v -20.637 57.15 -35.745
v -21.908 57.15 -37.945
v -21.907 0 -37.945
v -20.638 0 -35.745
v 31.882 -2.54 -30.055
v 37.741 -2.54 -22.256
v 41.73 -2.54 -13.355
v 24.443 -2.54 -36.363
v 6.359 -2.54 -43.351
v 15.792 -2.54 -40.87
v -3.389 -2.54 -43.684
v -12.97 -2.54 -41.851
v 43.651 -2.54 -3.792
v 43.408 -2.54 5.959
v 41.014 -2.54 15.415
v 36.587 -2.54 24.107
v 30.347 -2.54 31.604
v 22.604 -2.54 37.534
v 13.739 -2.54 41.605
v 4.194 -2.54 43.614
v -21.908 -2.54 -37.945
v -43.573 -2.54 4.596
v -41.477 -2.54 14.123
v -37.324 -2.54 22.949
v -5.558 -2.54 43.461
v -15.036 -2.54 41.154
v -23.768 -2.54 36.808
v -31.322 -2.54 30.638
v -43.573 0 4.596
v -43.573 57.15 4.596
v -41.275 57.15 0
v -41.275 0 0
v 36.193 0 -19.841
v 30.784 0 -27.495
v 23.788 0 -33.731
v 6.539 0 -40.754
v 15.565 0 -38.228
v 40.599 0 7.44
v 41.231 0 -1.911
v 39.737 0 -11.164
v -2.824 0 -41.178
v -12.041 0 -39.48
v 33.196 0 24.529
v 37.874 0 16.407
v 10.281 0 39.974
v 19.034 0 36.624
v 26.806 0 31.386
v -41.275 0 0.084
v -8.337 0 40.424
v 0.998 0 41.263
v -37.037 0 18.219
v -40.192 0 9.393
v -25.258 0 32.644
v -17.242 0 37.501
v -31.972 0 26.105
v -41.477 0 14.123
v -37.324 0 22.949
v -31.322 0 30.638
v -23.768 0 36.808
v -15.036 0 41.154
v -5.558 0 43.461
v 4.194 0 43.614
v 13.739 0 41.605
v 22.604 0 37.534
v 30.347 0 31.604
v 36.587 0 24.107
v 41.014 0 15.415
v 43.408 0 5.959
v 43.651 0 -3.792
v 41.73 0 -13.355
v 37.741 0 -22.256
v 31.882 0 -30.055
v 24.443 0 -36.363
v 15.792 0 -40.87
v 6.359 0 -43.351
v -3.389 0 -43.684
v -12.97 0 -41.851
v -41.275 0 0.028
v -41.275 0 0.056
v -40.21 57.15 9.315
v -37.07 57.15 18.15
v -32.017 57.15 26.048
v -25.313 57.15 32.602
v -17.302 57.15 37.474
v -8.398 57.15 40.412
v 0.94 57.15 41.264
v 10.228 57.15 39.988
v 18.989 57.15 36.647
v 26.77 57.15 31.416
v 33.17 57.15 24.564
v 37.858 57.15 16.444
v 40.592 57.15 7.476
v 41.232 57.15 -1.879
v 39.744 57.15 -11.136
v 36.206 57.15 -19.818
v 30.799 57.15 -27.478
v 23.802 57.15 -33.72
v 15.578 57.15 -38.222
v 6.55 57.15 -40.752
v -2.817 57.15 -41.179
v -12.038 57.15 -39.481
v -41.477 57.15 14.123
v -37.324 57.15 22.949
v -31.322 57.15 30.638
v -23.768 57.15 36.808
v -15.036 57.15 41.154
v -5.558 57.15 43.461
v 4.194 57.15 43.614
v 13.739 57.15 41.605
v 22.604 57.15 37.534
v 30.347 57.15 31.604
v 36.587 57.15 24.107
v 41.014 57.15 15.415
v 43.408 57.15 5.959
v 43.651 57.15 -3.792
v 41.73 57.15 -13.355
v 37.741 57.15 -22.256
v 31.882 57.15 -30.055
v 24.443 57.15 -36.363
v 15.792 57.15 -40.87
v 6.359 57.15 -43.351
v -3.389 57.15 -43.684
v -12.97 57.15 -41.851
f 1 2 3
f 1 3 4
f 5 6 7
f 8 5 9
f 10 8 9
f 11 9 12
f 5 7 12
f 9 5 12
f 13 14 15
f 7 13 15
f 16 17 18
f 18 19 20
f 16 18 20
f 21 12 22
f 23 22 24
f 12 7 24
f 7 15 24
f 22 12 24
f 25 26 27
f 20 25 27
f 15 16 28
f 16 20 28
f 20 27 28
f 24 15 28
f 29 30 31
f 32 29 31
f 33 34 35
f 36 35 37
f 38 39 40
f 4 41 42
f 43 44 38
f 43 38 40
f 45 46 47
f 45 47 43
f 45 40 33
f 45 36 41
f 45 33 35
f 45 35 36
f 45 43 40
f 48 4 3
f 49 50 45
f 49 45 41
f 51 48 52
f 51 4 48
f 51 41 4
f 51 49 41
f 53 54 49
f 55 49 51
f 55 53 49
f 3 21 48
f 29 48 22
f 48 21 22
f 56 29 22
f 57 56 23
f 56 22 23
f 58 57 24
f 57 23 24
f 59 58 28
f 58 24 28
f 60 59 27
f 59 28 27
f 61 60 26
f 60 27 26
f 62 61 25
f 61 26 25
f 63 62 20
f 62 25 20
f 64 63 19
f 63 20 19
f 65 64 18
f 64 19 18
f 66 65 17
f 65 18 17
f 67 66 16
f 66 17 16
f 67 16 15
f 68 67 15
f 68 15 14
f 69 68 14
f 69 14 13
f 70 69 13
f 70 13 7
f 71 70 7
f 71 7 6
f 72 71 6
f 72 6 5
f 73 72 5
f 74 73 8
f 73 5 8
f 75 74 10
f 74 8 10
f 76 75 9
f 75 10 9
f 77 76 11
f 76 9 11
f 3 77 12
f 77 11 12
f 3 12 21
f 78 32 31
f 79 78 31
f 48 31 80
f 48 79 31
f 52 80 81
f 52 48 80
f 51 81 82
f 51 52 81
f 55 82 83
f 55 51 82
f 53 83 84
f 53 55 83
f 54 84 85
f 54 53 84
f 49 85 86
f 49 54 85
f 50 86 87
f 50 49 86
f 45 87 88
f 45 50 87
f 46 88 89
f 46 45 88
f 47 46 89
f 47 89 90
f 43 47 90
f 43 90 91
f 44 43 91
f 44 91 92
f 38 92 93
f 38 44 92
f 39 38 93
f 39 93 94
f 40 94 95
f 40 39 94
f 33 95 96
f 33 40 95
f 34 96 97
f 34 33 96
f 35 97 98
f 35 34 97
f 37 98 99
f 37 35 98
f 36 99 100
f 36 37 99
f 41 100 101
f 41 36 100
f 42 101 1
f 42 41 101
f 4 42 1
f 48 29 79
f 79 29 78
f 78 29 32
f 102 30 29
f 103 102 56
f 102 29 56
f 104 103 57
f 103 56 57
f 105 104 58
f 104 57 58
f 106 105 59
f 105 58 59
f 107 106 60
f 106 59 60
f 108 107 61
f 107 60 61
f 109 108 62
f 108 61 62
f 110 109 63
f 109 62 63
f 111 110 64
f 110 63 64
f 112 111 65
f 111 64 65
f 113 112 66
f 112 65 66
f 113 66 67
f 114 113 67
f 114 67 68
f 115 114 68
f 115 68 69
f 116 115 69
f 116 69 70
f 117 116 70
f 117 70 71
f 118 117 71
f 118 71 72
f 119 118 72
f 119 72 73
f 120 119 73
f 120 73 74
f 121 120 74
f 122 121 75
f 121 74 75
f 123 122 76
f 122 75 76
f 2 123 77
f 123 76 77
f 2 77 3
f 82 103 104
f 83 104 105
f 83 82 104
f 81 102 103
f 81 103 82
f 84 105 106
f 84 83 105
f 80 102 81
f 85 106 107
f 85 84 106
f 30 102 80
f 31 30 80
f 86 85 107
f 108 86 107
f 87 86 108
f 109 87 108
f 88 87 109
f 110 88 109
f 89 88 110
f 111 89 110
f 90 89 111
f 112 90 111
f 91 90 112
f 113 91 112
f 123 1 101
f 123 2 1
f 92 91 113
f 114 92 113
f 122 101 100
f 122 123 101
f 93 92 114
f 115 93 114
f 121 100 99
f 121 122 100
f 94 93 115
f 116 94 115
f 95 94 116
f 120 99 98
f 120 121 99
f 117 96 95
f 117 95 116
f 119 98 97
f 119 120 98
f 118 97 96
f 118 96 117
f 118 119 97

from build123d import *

# Parameters (mm, degrees)
SKETCH1_R           = 43.815
SKETCH1_R_2         = 41.275
EXTRUDE_THIN1_DEPTH = 57.15
CUT_EXTRUDE12_DEPTH = 85.29490465
CHAMFER1_SIZE       = 2.54
BOSS_EXTRUDE1_START = 2.54
BOSS_EXTRUDE1_DEPTH = 2.54


with BuildPart() as part:
    # Sketch1 → Extrude-Thin1 (new body)
    with BuildSketch(Plane(origin=(0, 0, 0), x_dir=(1, 0, 0), z_dir=(0, 1, 0))):
        Circle(SKETCH1_R)
        Circle(SKETCH1_R_2, mode=Mode.SUBTRACT)
    extrude(amount=EXTRUDE_THIN1_DEPTH)

    # Sketch4 → Cut-Extrude12 (cut, through all)
    with BuildSketch(Plane(origin=(0, 57.15, 0), x_dir=(1, 0, 0), z_dir=(0, 1, 0))):
        with BuildLine():
            Line((-41.275, 0), (-43.815, 0))
            ThreePointArc((-43.815, 0), (-37.944903067, 21.9075), (-21.9075, 37.944903067))
            Line((-21.9075, 37.944903067), (-20.6375, 35.745198541))
            ThreePointArc((-20.6375, 35.745198541), (-35.745198541, 20.6375), (-41.275, 0))
        make_face()
    extrude(amount=-CUT_EXTRUDE12_DEPTH, mode=Mode.SUBTRACT)

    # Chamfer1
    # the kernel refuses this chamfer: 5.08, 2.54 mm, written as the material it takes off along each edge
    with BuildSketch(Plane(origin=(-43.815, 69.10149318, 0), x_dir=(0.0525256370506935, 0, 0.998619575940918), z_dir=(0, -1, 0))) as chamfer1_piece_1:
        with BuildLine():
            Line((4.602821575, 0), (CHAMFER1_SIZE * 0.0525256370507, -CHAMFER1_SIZE * 0.998619575941))
            Line((CHAMFER1_SIZE * 0.0525256370507, -CHAMFER1_SIZE * 0.998619575941), (0, 0))
            ThreePointArc((0, 0), (2.389793213, 0.060394139), (4.602821575, 0))
        make_face()
    extrude(amount=81.05298636, mode=Mode.SUBTRACT)

    # Sketch5 → Boss-Extrude1 (add)
    with BuildSketch(Plane.XZ.offset(BOSS_EXTRUDE1_START)):
        with BuildLine():
            Line((-21.9075, -37.944903067), (-43.573233865, 4.596467729))
            ThreePointArc((-43.573233865, 4.596467729), (39.043228403, 19.884178154), (-21.9075, -37.944903067))
        make_face()
    extrude(amount=-BOSS_EXTRUDE1_DEPTH)


solid = part.part
